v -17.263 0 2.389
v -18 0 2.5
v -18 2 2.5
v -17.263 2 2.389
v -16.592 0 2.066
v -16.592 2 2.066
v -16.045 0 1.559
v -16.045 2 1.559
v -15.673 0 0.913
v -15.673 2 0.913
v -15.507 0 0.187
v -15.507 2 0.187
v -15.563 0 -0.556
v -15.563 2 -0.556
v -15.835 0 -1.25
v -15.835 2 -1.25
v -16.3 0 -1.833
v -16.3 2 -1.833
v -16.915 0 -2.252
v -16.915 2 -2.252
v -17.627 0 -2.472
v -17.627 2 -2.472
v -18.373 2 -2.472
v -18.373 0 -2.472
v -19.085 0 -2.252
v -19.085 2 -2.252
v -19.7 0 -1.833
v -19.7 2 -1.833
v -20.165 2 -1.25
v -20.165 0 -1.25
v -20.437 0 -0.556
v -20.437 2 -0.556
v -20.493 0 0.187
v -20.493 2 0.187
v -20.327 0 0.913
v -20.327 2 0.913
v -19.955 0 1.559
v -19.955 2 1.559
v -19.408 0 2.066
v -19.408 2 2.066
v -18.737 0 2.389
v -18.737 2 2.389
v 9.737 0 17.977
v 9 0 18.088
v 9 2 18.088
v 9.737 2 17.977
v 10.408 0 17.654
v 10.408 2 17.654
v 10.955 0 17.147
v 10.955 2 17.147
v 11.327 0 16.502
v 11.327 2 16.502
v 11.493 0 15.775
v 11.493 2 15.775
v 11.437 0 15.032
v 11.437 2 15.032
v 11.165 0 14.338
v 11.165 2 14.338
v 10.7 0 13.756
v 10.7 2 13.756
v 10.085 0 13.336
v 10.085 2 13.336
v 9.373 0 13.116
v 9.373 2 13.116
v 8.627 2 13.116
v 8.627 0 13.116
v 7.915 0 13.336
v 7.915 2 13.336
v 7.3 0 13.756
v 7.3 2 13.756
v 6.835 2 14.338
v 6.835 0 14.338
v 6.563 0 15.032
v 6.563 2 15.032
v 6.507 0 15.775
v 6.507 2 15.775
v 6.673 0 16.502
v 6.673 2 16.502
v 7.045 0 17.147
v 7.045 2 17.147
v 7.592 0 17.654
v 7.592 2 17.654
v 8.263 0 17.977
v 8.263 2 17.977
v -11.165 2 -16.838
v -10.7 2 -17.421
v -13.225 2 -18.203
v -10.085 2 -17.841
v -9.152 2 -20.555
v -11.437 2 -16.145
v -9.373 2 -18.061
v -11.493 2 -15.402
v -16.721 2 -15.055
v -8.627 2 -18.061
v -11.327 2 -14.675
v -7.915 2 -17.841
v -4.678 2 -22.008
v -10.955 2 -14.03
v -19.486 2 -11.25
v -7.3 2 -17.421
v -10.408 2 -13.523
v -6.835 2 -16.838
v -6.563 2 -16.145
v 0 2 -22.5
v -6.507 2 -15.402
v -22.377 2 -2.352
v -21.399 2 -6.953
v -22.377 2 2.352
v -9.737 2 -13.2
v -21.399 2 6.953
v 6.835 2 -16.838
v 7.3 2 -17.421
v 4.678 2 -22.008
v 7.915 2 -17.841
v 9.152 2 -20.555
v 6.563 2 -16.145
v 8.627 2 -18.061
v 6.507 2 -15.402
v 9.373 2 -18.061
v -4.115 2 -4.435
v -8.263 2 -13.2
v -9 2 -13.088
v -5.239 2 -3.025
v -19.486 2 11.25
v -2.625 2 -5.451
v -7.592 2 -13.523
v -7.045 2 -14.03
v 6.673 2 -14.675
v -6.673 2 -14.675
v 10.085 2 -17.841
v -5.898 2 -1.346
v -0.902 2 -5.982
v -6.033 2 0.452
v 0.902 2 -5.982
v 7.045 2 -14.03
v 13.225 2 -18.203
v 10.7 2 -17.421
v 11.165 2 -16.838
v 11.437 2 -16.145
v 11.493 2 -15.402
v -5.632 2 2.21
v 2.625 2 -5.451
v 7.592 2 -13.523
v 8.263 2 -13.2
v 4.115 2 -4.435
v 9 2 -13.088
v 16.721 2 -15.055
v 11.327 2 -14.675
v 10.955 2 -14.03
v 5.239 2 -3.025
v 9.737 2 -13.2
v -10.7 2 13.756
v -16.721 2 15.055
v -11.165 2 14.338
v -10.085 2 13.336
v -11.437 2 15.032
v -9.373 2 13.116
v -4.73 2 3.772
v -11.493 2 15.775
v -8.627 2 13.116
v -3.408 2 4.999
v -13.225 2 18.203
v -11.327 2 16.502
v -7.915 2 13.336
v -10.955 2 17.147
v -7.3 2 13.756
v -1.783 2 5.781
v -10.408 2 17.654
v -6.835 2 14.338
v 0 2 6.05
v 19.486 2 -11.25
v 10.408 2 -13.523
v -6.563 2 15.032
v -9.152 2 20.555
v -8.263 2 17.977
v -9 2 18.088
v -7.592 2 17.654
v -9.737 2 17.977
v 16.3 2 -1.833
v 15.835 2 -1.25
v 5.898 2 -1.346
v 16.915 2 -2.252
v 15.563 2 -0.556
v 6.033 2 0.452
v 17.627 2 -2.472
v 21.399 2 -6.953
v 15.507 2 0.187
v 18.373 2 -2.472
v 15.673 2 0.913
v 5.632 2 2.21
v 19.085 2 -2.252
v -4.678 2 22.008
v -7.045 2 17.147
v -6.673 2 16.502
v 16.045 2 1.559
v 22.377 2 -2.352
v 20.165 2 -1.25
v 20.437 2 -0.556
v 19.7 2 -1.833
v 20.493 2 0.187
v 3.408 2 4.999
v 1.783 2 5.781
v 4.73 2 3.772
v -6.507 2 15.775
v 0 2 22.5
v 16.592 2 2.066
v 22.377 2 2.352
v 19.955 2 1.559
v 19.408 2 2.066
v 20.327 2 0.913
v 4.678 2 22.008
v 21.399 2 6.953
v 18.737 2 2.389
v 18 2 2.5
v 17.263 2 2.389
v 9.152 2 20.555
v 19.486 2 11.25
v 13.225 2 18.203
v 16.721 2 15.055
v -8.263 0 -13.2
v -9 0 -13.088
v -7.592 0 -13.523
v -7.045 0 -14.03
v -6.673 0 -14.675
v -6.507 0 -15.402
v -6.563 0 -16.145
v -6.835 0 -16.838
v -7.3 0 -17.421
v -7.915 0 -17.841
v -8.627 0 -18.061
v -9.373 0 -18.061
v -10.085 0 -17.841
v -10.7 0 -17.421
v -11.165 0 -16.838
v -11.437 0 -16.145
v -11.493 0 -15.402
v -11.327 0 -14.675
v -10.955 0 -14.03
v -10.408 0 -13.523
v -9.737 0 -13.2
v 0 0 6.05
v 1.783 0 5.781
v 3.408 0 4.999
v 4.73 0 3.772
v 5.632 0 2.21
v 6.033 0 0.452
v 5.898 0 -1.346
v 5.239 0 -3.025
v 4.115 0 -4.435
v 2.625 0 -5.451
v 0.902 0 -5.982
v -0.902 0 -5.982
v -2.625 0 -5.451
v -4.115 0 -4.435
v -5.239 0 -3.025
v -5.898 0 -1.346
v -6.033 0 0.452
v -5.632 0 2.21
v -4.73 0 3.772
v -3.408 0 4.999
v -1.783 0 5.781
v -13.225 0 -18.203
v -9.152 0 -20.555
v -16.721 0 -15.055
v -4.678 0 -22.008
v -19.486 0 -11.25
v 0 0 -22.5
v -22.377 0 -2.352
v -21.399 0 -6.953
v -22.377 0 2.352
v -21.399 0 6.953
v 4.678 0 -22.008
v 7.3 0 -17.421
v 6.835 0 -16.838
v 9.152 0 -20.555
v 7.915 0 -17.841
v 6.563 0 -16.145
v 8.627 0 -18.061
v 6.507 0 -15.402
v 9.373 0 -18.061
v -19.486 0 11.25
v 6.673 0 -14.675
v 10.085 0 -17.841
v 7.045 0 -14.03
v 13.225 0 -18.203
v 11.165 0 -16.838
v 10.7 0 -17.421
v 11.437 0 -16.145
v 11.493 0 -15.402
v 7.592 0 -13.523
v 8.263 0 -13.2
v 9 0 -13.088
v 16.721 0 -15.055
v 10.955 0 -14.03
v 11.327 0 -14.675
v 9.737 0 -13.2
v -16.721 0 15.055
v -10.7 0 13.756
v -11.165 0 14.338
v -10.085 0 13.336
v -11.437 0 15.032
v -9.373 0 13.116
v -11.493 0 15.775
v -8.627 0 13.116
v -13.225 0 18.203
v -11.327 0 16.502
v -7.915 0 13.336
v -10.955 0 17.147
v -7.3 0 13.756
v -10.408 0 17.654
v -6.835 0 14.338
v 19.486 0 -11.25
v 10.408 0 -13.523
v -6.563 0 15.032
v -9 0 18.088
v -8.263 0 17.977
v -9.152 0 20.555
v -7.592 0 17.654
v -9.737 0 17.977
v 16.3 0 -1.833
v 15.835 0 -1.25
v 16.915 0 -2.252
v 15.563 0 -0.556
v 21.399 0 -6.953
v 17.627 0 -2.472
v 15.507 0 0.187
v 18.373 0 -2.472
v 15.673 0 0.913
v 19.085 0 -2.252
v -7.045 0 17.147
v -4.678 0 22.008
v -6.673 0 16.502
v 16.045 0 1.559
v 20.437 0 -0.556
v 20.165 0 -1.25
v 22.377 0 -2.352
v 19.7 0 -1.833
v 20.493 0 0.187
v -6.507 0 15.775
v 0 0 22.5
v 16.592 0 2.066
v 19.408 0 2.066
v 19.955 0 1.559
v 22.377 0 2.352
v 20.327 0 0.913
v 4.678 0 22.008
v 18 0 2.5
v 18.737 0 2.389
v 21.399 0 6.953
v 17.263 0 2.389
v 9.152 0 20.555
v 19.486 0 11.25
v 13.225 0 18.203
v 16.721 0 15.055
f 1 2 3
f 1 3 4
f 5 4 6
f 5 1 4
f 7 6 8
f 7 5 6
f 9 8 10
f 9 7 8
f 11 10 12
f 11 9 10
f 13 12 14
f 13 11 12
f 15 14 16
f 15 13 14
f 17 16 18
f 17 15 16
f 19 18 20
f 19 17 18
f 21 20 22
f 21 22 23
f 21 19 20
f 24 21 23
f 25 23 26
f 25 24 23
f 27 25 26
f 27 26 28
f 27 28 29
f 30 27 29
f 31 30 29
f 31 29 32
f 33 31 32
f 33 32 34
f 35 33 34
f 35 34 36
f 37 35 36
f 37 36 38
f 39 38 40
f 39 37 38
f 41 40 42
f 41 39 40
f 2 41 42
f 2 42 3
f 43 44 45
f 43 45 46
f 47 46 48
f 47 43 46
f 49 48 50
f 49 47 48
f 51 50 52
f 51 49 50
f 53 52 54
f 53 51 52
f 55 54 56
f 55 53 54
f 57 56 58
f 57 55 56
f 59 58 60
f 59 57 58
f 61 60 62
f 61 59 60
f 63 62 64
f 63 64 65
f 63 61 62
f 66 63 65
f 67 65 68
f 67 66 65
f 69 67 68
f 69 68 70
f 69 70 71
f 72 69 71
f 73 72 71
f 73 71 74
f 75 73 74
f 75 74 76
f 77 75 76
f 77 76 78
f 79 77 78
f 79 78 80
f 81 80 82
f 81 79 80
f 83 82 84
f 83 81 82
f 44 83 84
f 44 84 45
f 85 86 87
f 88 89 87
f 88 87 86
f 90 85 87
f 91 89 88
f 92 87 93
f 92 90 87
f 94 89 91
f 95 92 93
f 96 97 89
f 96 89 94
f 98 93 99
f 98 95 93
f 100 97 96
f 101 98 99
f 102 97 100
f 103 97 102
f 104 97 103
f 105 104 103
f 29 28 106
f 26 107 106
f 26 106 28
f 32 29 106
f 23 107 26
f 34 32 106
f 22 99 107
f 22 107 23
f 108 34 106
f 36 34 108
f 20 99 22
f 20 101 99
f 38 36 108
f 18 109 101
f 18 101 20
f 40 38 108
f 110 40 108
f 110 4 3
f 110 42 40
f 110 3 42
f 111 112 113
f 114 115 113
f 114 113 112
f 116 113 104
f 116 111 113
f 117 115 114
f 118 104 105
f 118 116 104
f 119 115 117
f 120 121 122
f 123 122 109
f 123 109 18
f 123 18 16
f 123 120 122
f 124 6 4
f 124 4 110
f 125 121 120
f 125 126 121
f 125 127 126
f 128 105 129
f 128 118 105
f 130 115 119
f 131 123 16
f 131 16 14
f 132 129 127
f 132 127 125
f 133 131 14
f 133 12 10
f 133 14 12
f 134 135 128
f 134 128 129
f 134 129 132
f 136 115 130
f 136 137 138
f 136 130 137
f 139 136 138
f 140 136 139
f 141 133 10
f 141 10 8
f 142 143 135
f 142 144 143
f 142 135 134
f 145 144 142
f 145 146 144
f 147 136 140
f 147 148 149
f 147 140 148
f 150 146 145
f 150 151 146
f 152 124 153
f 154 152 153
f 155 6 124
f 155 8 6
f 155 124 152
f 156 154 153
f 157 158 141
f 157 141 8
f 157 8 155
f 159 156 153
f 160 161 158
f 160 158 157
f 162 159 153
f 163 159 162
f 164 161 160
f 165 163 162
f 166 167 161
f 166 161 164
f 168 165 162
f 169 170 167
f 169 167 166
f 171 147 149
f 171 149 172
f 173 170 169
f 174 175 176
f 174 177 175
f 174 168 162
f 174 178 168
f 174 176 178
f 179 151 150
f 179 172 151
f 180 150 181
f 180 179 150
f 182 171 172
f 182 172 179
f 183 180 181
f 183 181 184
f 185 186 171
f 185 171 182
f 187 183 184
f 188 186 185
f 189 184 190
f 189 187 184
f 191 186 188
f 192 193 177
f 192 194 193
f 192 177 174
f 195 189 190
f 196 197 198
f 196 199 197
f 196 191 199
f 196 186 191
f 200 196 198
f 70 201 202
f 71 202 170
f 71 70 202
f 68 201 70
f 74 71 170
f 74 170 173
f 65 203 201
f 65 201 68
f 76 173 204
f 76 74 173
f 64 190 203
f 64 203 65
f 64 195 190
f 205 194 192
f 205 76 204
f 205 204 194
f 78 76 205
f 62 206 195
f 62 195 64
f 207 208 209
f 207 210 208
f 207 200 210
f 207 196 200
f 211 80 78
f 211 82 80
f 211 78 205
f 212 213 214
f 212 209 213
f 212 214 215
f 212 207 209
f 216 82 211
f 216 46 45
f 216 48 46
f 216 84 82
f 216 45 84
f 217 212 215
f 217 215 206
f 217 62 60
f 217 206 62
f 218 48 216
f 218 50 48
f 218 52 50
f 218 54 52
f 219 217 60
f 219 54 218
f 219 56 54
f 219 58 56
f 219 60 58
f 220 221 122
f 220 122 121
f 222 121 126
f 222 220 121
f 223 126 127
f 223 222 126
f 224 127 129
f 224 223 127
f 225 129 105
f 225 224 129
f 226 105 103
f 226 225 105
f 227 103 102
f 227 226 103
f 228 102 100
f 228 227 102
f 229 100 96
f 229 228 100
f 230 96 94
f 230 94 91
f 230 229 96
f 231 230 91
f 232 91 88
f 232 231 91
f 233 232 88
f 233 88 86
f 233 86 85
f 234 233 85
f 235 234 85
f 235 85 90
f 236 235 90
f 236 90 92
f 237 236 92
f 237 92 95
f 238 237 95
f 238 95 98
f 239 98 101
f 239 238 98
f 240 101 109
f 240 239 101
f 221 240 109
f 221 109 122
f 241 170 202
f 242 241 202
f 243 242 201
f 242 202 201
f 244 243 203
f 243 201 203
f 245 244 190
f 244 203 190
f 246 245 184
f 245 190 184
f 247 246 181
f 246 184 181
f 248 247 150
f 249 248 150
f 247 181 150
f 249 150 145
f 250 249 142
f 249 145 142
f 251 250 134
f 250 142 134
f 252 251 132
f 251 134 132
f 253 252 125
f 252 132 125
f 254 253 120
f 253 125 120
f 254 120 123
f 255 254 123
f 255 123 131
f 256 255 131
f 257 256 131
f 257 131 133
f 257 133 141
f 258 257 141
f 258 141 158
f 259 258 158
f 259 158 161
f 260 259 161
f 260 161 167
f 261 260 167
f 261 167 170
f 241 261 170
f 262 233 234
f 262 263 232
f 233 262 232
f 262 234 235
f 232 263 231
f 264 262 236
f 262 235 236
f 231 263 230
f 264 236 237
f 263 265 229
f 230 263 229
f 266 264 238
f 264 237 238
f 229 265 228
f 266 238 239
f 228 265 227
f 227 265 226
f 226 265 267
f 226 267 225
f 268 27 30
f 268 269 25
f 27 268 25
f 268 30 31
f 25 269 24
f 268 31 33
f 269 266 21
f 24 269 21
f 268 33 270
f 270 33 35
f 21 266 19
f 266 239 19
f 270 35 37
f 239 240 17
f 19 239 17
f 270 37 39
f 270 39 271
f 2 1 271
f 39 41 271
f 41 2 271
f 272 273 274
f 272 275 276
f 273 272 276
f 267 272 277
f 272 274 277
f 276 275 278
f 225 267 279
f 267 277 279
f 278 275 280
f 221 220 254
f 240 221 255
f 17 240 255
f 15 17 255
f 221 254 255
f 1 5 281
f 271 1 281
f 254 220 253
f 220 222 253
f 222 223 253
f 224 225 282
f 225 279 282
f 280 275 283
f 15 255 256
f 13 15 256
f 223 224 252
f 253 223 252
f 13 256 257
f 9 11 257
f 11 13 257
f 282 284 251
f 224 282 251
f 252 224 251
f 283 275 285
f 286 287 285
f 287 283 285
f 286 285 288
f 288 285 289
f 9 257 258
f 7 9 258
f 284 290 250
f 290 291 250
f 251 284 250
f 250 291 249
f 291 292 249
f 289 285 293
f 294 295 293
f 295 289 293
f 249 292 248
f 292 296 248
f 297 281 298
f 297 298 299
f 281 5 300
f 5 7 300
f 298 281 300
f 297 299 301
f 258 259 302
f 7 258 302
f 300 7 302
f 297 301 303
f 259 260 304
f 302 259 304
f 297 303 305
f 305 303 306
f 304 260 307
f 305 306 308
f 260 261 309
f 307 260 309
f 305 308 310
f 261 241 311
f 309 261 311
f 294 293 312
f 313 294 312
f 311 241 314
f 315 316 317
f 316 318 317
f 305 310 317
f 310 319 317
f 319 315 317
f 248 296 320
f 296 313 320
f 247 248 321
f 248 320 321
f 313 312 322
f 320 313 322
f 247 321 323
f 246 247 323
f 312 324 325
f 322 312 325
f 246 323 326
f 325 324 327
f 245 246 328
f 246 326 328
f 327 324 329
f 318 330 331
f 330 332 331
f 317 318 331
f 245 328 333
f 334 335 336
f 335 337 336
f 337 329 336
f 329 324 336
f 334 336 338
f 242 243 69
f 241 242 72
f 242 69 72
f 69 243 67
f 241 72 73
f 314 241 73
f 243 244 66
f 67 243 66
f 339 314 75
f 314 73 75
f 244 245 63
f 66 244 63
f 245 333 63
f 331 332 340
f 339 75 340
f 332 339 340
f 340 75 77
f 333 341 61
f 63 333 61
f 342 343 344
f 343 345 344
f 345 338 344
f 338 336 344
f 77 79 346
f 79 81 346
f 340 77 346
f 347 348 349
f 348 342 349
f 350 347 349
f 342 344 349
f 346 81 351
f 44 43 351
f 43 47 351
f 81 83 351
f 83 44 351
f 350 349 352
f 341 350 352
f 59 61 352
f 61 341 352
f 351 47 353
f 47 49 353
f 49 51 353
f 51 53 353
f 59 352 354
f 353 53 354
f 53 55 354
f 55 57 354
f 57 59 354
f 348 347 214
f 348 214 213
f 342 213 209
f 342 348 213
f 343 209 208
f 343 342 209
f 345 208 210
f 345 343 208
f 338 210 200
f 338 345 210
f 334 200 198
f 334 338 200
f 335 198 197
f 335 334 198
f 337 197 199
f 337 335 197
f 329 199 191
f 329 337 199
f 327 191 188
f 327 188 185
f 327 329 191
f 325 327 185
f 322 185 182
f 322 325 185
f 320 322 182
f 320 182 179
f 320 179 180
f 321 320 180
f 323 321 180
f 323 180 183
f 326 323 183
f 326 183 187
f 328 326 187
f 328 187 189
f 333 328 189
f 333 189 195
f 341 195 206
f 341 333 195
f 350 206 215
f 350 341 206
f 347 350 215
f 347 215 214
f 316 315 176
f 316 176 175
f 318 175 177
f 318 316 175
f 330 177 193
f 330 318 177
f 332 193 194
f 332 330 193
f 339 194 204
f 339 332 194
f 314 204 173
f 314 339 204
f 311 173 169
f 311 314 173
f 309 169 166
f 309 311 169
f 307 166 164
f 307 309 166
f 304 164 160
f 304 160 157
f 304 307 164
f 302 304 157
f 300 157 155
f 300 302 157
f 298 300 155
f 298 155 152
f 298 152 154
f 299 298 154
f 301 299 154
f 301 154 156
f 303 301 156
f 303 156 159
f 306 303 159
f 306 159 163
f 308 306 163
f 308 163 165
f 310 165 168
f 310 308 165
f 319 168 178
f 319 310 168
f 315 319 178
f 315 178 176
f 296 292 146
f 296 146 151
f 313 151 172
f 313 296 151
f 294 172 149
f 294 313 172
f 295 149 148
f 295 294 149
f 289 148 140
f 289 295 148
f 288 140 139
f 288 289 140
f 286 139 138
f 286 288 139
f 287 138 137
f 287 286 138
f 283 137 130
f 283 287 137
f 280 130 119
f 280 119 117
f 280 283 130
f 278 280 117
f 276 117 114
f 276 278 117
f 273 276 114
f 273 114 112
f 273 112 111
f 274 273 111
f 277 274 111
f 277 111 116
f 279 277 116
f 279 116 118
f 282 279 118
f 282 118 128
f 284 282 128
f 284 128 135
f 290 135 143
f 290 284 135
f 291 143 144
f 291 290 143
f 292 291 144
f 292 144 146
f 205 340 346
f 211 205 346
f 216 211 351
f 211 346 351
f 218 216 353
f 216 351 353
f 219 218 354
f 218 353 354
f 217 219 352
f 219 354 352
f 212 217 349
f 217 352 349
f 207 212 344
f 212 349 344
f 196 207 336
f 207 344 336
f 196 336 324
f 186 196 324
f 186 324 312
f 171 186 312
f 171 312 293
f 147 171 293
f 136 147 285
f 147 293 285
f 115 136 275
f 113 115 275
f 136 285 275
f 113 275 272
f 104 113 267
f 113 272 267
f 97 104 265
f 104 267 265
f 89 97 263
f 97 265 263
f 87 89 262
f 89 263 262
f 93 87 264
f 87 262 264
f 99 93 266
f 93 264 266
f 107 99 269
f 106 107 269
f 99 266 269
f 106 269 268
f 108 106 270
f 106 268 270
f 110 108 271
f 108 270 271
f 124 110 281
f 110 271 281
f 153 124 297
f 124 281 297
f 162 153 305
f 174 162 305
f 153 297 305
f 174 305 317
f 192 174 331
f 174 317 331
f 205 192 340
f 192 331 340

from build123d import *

# Parameters (mm, degrees)
SKETCH2_R           = 22.5
SKETCH2_R_2         = 2.5
BOSS_EXTRUDE1_DEPTH = 2
CUT_EXTRUDE1_REACH  = 33.883
SKETCH3_R           = 6.05


with BuildPart() as part:
    # Sketch2 → Boss-Extrude1 (new body)
    with BuildSketch(Plane(origin=(0, 0, 0), x_dir=(1, 0, 0), z_dir=(0, 1, 0))):
        with Locations(Location((0, 0, 0), (0, 0, 270))):
            Circle(SKETCH2_R)
        with Locations(Location((-18, 0, 0), (0, 0, 270))):
            Circle(SKETCH2_R_2, mode=Mode.SUBTRACT)
        with Locations(Location((-9, 15.588457268, 0), (0, 0, 270))):
            Circle(SKETCH2_R_2, mode=Mode.SUBTRACT)
        with Locations(Location((9, 15.588457268, 0), (0, 0, 270))):
            Circle(SKETCH2_R_2, mode=Mode.SUBTRACT)
        with Locations(Location((18, 0, 0), (0, 0, 270))):
            Circle(SKETCH2_R_2, mode=Mode.SUBTRACT)
        with Locations(Location((9, -15.588457268, 0), (0, 0, 270))):
            Circle(SKETCH2_R_2, mode=Mode.SUBTRACT)
        with Locations(Location((-9, -15.588457268, 0), (0, 0, 270))):
            Circle(SKETCH2_R_2, mode=Mode.SUBTRACT)
    extrude(amount=BOSS_EXTRUDE1_DEPTH)

    # Sketch3 → Cut-Extrude1 (cut, up to next)
    with BuildSketch(Plane(origin=(0, 2, 0), x_dir=(1, 0, 0), z_dir=(0, 1, 0)), mode=Mode.PRIVATE) as cut_extrude1_sk1:
        with Locations(Location((0, 0, 0), (0, 0, 270))):
            Circle(SKETCH3_R)
    cut_extrude1_tool1 = extrude(cut_extrude1_sk1.sketch, amount=-CUT_EXTRUDE1_REACH, mode=Mode.PRIVATE) & part.part
    add(cut_extrude1_tool1.solids().sort_by_distance((0, 2, 0))[0], mode=Mode.SUBTRACT)


solid = part.part
